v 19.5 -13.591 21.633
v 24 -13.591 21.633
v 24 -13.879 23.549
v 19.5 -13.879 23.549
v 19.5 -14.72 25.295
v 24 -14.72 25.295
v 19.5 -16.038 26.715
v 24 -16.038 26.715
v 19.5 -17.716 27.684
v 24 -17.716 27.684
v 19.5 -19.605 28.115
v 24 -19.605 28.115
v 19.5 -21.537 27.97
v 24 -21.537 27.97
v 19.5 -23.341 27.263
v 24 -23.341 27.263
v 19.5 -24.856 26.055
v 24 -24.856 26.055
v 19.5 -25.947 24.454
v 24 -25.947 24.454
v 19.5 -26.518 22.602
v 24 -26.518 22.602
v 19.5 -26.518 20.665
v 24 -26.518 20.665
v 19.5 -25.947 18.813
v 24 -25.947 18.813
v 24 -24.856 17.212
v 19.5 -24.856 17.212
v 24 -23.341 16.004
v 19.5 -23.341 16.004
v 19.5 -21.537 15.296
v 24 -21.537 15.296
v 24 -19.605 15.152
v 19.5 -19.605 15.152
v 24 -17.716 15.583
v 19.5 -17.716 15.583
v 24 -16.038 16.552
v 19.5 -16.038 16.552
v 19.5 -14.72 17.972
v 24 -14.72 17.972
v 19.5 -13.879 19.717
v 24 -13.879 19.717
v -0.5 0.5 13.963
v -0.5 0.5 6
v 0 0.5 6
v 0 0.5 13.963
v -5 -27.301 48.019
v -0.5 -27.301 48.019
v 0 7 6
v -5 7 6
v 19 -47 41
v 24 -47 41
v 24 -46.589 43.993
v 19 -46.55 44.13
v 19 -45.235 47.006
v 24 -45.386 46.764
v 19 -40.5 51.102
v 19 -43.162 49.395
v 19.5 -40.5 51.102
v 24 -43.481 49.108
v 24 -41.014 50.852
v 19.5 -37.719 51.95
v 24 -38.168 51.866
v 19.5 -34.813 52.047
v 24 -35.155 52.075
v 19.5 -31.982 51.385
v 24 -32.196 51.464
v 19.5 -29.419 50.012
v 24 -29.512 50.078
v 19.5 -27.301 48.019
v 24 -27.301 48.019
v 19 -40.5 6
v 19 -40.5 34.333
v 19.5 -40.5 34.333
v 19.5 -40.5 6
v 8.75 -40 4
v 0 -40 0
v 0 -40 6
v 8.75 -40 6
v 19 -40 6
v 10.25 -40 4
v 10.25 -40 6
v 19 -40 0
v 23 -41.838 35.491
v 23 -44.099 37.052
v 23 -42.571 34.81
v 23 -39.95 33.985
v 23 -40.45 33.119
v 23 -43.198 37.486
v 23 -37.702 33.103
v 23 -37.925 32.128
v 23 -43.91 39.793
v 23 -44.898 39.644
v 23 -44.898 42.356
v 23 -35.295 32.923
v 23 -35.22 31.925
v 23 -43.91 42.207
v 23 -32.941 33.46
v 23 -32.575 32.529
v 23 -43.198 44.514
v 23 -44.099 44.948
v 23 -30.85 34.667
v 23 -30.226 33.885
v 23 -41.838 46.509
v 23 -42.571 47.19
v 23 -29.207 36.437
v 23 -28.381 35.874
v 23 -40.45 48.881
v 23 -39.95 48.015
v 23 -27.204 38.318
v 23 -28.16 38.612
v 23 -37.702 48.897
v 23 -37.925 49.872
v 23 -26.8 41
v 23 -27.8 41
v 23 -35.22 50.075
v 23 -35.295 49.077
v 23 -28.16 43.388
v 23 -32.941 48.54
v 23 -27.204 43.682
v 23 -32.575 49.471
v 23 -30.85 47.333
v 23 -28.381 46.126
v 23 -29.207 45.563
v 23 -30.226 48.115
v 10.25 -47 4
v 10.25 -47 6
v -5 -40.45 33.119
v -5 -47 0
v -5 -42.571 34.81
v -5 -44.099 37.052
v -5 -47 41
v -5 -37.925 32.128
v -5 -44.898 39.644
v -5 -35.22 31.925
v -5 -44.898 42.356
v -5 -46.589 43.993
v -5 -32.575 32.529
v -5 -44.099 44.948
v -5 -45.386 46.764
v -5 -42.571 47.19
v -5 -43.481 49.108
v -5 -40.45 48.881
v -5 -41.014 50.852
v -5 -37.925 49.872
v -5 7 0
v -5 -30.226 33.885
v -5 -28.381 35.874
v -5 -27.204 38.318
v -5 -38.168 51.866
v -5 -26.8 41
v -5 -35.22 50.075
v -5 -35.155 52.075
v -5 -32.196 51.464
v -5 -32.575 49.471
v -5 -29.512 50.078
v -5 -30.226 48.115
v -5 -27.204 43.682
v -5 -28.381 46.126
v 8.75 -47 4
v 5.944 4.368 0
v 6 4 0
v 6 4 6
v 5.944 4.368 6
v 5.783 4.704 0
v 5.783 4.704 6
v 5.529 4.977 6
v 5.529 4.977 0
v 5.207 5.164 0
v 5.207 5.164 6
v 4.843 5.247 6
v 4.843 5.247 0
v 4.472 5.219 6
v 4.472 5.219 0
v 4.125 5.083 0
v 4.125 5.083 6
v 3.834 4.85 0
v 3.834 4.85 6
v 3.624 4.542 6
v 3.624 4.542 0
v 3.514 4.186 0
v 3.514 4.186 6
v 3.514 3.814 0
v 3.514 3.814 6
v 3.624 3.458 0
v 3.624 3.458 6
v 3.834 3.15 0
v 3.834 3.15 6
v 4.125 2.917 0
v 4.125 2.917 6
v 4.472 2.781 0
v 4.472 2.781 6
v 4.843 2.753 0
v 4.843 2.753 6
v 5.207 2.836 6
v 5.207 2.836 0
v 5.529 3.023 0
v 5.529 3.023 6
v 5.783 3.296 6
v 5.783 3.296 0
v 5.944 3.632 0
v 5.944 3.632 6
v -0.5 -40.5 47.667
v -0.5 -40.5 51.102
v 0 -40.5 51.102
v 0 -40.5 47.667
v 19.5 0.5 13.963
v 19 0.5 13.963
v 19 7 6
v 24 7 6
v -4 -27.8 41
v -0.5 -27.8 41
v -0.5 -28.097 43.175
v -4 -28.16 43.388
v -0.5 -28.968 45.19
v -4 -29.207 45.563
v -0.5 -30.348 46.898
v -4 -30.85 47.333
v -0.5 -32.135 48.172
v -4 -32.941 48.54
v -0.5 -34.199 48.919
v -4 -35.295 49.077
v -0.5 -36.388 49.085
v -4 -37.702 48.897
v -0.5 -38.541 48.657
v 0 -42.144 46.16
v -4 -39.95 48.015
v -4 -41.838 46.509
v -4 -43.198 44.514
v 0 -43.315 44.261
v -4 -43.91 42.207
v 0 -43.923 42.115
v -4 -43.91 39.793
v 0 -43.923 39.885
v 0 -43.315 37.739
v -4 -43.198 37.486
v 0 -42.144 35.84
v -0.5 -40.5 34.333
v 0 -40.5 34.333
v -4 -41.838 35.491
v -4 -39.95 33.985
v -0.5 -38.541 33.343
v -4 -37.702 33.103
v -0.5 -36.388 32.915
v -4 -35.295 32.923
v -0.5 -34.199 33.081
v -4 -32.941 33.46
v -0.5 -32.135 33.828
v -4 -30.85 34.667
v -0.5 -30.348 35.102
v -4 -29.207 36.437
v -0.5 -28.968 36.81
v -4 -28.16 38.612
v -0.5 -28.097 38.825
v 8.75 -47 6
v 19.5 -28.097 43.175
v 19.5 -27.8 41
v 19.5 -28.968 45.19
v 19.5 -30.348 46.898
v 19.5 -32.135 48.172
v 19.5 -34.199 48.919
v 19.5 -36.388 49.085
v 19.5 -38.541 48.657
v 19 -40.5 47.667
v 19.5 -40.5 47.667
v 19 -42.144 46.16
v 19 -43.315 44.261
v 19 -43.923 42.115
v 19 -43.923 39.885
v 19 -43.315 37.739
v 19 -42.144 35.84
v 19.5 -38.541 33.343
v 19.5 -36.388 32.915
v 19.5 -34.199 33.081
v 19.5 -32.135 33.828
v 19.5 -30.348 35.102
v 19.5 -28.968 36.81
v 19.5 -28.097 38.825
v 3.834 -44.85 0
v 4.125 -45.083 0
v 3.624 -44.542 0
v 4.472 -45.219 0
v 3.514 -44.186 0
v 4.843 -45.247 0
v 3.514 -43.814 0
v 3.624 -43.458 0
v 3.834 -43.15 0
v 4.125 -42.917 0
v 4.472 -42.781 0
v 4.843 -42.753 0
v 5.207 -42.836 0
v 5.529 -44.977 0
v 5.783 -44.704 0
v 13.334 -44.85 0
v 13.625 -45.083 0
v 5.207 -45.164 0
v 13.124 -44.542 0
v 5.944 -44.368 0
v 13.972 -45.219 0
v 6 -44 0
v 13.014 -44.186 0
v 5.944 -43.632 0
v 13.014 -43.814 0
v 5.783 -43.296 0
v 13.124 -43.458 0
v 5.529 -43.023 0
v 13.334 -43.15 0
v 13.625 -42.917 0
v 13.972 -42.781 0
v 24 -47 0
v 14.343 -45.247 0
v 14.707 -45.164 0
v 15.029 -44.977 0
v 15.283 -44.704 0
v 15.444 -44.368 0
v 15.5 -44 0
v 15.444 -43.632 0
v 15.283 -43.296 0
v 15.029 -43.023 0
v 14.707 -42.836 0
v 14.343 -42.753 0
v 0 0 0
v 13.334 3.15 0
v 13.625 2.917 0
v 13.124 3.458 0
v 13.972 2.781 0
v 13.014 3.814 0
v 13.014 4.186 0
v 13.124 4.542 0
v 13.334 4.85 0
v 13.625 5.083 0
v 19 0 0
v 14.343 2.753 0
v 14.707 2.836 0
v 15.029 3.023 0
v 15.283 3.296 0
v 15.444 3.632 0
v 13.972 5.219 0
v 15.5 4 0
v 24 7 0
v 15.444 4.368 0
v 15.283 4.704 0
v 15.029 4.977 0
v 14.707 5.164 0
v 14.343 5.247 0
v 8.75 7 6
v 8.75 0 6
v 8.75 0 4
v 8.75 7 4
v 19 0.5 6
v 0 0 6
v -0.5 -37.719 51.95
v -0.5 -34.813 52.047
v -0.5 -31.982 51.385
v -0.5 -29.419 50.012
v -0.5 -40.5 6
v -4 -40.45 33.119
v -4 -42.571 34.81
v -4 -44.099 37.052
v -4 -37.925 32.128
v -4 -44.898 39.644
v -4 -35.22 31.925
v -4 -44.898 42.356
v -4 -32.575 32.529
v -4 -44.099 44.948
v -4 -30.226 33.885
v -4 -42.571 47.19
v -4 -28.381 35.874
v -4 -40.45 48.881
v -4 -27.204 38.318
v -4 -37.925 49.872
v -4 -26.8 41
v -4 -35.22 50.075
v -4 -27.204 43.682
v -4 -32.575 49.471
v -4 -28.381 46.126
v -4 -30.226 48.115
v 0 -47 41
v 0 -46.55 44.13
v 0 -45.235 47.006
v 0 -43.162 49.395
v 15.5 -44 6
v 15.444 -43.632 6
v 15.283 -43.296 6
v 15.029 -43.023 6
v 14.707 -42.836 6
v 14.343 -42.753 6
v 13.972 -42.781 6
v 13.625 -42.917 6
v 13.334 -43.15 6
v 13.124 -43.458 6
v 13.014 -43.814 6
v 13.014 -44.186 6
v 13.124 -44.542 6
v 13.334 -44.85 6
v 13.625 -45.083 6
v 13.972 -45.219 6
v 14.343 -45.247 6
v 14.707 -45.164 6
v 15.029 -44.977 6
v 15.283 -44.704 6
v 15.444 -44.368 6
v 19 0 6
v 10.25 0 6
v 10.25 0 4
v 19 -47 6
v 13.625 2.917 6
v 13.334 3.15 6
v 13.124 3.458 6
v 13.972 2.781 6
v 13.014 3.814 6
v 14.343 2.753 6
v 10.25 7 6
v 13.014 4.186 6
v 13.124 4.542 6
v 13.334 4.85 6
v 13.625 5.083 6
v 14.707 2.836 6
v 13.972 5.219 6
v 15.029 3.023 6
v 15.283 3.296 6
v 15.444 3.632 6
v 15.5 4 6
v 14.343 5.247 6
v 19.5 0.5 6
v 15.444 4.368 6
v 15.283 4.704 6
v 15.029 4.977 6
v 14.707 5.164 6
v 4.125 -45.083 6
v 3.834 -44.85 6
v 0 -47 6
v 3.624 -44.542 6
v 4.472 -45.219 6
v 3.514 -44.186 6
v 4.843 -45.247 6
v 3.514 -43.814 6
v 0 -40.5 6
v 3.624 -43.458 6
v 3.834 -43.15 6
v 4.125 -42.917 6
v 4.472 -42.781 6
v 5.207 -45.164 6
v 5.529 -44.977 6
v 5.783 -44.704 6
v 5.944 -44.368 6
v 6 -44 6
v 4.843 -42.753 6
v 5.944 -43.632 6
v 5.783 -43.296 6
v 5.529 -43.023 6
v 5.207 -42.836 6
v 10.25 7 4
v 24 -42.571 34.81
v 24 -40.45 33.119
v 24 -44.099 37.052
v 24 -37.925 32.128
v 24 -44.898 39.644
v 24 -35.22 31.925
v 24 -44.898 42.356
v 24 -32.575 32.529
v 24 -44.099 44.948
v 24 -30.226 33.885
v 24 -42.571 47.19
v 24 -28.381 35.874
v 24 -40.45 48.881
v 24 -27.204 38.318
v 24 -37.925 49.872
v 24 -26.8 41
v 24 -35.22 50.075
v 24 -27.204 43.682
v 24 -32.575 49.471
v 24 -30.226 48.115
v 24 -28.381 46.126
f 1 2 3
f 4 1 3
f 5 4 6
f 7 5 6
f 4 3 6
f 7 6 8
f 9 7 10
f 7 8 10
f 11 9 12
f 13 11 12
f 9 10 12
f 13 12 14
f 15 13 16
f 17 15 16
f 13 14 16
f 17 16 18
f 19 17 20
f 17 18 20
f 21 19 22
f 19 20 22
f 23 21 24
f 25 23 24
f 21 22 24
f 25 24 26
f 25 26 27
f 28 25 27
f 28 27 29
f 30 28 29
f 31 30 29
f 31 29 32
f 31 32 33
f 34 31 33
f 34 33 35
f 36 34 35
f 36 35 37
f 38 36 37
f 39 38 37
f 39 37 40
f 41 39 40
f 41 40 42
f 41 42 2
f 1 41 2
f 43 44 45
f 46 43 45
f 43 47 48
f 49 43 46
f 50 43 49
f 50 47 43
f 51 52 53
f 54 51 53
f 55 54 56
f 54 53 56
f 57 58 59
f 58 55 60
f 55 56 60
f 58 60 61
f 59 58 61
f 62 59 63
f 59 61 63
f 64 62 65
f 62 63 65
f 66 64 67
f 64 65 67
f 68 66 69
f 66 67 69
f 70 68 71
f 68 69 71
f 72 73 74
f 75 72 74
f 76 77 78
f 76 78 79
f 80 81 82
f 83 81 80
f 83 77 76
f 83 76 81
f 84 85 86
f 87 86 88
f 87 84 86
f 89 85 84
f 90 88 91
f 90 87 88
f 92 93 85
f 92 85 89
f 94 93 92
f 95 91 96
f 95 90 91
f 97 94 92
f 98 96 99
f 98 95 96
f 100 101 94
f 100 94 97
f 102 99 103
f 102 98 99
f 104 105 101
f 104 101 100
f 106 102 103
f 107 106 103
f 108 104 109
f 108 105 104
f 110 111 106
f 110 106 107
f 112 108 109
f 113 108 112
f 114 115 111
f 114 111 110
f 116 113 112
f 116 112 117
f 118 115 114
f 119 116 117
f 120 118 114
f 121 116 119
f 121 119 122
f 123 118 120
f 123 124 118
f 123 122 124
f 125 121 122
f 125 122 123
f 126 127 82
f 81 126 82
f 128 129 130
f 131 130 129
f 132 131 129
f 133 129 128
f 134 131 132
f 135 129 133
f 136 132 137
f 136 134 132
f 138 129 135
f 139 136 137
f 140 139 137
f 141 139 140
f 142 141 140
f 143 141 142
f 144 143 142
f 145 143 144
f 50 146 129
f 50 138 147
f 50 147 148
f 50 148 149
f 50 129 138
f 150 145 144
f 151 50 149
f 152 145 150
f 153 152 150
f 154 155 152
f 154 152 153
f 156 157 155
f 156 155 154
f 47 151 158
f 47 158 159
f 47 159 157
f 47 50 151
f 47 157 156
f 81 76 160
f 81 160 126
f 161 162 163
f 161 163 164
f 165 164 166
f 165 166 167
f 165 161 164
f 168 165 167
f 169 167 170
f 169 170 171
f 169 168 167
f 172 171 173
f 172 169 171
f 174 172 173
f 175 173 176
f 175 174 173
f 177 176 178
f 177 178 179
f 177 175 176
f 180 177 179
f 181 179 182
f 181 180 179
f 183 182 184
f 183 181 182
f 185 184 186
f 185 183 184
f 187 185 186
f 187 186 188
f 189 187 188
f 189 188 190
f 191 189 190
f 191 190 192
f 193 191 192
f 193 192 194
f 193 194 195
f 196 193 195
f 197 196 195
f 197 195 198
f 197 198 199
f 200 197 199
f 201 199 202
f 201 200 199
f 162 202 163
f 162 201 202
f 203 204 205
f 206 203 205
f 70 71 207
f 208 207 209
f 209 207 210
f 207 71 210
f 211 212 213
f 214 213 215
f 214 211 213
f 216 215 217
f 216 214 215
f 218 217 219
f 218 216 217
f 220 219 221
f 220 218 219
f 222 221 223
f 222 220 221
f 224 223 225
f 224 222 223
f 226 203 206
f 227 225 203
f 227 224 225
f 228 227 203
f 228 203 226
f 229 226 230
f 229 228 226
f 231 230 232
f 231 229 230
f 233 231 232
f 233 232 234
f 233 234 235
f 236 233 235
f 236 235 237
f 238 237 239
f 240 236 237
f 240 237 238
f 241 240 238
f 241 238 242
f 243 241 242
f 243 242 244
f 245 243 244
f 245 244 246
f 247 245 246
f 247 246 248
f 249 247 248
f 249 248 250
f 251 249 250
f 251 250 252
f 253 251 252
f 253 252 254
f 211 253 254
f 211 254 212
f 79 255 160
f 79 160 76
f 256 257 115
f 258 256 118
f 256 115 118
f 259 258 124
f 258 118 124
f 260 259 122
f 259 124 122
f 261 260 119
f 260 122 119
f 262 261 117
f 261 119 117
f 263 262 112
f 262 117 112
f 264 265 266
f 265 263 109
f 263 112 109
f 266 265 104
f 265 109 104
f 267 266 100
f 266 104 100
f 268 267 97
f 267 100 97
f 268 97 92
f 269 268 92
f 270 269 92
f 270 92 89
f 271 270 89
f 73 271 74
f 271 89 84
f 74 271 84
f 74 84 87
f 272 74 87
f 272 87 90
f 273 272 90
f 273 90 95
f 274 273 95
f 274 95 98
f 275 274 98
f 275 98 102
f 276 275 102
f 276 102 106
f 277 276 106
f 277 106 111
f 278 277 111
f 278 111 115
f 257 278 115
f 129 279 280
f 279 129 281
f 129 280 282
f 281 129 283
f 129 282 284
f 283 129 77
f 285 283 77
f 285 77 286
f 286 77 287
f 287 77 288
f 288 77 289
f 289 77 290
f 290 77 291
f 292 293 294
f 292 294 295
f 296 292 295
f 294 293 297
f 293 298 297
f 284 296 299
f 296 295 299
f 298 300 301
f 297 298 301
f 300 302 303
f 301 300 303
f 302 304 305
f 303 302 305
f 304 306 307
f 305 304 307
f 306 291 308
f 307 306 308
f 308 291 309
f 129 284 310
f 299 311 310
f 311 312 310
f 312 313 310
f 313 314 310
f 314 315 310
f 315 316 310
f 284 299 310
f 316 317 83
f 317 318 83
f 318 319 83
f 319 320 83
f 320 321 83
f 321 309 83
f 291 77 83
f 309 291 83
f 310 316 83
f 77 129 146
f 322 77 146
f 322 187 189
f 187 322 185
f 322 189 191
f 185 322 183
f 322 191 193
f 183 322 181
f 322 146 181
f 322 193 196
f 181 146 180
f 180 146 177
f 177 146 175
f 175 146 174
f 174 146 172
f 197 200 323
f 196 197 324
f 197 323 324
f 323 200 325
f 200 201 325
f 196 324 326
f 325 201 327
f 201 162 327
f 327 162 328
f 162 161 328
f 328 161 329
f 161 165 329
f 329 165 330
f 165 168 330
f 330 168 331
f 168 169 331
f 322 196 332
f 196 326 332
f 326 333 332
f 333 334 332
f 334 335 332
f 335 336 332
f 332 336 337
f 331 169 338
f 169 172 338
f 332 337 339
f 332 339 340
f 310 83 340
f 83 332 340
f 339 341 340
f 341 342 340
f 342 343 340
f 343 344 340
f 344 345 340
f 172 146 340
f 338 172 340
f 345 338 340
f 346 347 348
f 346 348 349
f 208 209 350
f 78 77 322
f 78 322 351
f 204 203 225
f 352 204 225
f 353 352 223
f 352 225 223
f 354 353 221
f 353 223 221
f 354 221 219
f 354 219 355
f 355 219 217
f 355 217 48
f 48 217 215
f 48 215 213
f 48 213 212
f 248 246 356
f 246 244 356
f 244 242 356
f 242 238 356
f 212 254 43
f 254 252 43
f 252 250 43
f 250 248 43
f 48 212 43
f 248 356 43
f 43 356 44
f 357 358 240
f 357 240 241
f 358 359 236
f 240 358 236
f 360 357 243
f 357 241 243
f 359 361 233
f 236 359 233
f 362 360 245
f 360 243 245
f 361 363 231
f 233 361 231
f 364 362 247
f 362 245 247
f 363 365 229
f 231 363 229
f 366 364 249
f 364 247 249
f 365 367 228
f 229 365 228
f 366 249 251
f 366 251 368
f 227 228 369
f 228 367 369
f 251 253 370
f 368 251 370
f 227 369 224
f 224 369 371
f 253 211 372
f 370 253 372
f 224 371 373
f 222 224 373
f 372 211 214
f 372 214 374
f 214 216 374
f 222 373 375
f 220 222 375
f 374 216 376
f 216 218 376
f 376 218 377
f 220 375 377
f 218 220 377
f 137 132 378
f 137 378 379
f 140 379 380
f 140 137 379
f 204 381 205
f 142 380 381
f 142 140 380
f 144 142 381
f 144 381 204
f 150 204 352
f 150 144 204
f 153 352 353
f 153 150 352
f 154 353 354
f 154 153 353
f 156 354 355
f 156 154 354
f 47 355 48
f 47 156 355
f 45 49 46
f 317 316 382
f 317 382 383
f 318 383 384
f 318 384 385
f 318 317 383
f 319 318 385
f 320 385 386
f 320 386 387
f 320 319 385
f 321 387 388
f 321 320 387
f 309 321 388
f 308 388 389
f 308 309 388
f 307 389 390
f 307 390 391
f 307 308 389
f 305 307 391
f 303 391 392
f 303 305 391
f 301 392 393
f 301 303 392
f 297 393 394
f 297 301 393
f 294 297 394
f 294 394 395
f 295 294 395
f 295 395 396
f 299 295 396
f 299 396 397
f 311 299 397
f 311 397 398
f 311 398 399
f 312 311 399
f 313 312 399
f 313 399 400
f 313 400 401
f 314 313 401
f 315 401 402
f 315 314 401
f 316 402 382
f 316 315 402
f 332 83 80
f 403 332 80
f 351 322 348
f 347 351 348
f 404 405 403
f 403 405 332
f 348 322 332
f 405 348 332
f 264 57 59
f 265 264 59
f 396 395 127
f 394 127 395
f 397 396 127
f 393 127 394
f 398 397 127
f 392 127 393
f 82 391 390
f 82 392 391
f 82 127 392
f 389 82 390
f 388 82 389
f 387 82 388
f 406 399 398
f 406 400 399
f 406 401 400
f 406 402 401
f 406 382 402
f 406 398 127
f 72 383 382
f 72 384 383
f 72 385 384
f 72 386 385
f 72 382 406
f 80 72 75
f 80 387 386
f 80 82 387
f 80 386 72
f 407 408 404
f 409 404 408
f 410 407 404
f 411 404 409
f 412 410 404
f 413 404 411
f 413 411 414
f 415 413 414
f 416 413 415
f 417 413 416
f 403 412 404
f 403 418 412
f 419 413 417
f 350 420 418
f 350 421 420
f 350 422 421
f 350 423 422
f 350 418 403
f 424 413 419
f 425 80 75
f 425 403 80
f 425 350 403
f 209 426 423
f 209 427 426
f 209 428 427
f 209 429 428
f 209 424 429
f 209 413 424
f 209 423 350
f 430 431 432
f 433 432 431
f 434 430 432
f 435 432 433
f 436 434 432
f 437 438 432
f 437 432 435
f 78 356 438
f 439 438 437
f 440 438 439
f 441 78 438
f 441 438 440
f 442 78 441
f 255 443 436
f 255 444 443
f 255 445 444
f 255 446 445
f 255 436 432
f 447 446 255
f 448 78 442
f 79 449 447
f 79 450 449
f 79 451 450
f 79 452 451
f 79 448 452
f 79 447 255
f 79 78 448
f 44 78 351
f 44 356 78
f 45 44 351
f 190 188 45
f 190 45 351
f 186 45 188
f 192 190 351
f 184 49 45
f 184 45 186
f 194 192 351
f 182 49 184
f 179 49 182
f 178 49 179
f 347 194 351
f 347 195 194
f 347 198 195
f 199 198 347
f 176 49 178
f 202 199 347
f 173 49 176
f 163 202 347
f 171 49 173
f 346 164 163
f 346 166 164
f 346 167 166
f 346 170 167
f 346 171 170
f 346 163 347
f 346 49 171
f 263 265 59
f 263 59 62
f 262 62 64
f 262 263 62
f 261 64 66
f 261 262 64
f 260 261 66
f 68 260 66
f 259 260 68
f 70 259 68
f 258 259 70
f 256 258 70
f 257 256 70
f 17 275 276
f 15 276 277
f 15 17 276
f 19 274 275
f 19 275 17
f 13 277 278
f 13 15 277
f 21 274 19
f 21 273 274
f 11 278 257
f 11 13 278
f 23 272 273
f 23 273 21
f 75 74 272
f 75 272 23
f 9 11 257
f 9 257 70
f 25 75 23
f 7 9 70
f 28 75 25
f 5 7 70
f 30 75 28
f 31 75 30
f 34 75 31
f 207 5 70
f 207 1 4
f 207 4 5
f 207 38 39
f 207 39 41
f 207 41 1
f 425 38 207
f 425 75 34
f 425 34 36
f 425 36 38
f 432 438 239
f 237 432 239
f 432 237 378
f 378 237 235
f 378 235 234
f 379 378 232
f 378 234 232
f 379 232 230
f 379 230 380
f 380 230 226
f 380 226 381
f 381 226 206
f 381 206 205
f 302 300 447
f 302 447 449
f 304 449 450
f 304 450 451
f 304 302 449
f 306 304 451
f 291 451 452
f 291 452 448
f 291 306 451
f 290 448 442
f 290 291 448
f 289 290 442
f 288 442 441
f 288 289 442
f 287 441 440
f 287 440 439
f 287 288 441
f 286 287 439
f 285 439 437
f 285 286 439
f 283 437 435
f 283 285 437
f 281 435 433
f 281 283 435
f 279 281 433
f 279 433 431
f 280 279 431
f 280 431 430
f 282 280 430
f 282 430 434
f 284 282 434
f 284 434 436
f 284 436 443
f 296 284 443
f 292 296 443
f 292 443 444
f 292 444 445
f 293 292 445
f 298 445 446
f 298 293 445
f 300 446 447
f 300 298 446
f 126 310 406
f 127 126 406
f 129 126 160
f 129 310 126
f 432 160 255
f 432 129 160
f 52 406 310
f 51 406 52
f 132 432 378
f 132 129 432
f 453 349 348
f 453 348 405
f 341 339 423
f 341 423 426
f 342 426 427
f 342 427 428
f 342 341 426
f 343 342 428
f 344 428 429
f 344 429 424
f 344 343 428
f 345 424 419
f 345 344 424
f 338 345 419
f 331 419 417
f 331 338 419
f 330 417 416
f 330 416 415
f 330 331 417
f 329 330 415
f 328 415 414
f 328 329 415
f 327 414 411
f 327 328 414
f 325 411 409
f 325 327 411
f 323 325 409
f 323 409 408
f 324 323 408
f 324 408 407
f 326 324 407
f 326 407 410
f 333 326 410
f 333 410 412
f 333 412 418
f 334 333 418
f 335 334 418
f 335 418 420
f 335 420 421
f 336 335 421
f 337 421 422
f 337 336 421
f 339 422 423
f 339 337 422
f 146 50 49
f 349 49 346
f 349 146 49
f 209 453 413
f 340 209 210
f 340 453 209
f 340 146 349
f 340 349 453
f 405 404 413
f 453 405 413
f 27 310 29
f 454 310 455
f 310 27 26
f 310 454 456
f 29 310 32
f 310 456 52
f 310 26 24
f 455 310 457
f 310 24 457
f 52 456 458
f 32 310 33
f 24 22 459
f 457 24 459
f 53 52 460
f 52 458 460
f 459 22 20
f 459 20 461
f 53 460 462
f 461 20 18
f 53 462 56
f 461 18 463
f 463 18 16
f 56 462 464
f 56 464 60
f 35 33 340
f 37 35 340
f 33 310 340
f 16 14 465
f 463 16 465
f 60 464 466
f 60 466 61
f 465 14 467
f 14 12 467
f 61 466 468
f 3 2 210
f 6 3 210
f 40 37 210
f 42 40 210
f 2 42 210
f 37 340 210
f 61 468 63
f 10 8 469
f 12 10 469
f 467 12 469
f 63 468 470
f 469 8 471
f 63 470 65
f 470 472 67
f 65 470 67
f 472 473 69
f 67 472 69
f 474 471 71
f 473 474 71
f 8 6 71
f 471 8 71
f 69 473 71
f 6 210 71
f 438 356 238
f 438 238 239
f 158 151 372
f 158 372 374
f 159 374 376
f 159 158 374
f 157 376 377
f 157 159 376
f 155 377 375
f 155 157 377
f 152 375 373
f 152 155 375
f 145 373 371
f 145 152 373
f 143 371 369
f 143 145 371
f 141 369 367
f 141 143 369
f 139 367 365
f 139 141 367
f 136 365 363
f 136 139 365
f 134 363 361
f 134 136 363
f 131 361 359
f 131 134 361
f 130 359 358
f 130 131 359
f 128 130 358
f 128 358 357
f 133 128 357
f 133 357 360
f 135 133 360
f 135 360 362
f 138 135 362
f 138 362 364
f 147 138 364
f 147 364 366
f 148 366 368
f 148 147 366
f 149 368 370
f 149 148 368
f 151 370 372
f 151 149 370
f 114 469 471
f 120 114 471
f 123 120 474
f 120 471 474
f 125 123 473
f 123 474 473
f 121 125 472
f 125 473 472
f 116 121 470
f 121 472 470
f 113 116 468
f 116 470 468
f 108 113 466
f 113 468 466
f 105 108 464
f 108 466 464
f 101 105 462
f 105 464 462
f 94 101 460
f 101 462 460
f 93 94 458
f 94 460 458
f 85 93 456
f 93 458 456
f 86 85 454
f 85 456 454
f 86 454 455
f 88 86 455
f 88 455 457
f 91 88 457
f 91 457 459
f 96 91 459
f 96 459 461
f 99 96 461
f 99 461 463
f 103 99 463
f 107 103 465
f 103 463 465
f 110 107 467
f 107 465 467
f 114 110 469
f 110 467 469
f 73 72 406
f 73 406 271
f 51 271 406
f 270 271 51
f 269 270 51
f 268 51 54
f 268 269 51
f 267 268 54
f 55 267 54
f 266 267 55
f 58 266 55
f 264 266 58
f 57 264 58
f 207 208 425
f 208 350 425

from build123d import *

# Parameters (mm, degrees)
SKETCH_1_W          = 29
SKETCH_1_H          = 54
SKETCH_1_R          = 1.25
SKETCH_1_W_2        = 19
SKETCH_1_H_2        = 40
EXTRUDE_1_DEPTH     = 6
SKETCH_2_W          = 1.5
SKETCH_2_H          = 7
CUT_EXTRUDE_1_DEPTH = 2
SKETCH_3_R          = 8.1
EXTRUDE_2_DEPTH     = 5
SKETCH_4_R          = 9.1
CUT_EXTRUDE_2_DEPTH = 1
SKETCH_5_W          = 20
SKETCH_5_H          = 41
CUT_EXTRUDE_3_DEPTH = 71.072890621
SKETCH_6_R          = 6.5
CUT_EXTRUDE_4_DEPTH = 5


with BuildPart() as part:
    # Эскиз1 → Бобышка-Вытянуть1 (new body)
    with BuildSketch(Plane.XY):
        with Locations((9.5, -20)):
            Rectangle(SKETCH_1_W, SKETCH_1_H)
        with Locations((4.75, 4)):
            Circle(SKETCH_1_R, mode=Mode.SUBTRACT)
        with Locations((14.25, 4)):
            Circle(SKETCH_1_R, mode=Mode.SUBTRACT)
        with Locations((4.75, -44)):
            Circle(SKETCH_1_R, mode=Mode.SUBTRACT)
        with Locations((14.25, -44)):
            Circle(SKETCH_1_R, mode=Mode.SUBTRACT)
        with Locations((9.5, -20)):
            Rectangle(SKETCH_1_W_2, SKETCH_1_H_2, mode=Mode.SUBTRACT)
    extrude(amount=EXTRUDE_1_DEPTH)

    # Эскиз2 → Вырез-Вытянуть1 (cut)
    with BuildSketch(Plane.XY.offset(6)):
        with Locations((9.5, -43.5)):
            Rectangle(SKETCH_2_W, SKETCH_2_H)
        with Locations((9.5, 3.5)):
            Rectangle(SKETCH_2_W, SKETCH_2_H)
    extrude(amount=-CUT_EXTRUDE_1_DEPTH, mode=Mode.SUBTRACT)

    # Эскиз3 → Бобышка-Вытянуть2 (add)
    with BuildSketch(Plane(origin=(24, 0, 0), x_dir=(0, 0, -1), z_dir=(1, 0, 0))):
        with BuildLine():
            Line((-6, -47), (-41, -47))
            ThreePointArc((-41, -47), (-51.456010485, -39.625834772), (-48.019345484, -27.301233288))
            Line((-48.019345484, -27.301233288), (-6, 7))
            Line((-6, 7), (-6, -47))
        make_face()
        with Locations(Location((-41, -35.9, 0), (0, 0, 90))):
            Circle(SKETCH_3_R, mode=Mode.SUBTRACT)
    extrude_2 = extrude(amount=-EXTRUDE_2_DEPTH)

    # Эскиз4 → Вырез-Вытянуть2 (cut)
    with BuildSketch(Plane(origin=(24, 0, 0), x_dir=(0, 0, -1), z_dir=(1, 0, 0))):
        with Locations(Location((-41, -35.9, 0), (0, 0, 90))):
            Circle(SKETCH_4_R)
    cut_extrude_2 = extrude(amount=-CUT_EXTRUDE_2_DEPTH, mode=Mode.SUBTRACT)

    # Зеркальное отражение1: Бобышка-Вытянуть2, Вырез-Вытянуть2 across plane
    add(extrude_2.mirror(Plane.ZY.offset(-9.5)))
    add(cut_extrude_2.mirror(Plane.ZY.offset(-9.5)), mode=Mode.SUBTRACT)

    # Эскиз5 → Вырез-Вытянуть3 (cut, through all)
    with BuildSketch(Plane.XY.offset(6)):
        with Locations((9.5, -20)):
            Rectangle(SKETCH_5_W, SKETCH_5_H)
    extrude(amount=CUT_EXTRUDE_3_DEPTH, mode=Mode.SUBTRACT)

    # Эскиз6 → Вырез-Вытянуть4 (cut)
    with BuildSketch(Plane(origin=(24, 0, 0), x_dir=(0, 0, -1), z_dir=(1, 0, 0))):
        with Locations(Location((-21.633408306, -20.090663323, 0), (0, 0, 90))):
            Circle(SKETCH_6_R)
    extrude(amount=-CUT_EXTRUDE_4_DEPTH, mode=Mode.SUBTRACT)


solid = part.part
